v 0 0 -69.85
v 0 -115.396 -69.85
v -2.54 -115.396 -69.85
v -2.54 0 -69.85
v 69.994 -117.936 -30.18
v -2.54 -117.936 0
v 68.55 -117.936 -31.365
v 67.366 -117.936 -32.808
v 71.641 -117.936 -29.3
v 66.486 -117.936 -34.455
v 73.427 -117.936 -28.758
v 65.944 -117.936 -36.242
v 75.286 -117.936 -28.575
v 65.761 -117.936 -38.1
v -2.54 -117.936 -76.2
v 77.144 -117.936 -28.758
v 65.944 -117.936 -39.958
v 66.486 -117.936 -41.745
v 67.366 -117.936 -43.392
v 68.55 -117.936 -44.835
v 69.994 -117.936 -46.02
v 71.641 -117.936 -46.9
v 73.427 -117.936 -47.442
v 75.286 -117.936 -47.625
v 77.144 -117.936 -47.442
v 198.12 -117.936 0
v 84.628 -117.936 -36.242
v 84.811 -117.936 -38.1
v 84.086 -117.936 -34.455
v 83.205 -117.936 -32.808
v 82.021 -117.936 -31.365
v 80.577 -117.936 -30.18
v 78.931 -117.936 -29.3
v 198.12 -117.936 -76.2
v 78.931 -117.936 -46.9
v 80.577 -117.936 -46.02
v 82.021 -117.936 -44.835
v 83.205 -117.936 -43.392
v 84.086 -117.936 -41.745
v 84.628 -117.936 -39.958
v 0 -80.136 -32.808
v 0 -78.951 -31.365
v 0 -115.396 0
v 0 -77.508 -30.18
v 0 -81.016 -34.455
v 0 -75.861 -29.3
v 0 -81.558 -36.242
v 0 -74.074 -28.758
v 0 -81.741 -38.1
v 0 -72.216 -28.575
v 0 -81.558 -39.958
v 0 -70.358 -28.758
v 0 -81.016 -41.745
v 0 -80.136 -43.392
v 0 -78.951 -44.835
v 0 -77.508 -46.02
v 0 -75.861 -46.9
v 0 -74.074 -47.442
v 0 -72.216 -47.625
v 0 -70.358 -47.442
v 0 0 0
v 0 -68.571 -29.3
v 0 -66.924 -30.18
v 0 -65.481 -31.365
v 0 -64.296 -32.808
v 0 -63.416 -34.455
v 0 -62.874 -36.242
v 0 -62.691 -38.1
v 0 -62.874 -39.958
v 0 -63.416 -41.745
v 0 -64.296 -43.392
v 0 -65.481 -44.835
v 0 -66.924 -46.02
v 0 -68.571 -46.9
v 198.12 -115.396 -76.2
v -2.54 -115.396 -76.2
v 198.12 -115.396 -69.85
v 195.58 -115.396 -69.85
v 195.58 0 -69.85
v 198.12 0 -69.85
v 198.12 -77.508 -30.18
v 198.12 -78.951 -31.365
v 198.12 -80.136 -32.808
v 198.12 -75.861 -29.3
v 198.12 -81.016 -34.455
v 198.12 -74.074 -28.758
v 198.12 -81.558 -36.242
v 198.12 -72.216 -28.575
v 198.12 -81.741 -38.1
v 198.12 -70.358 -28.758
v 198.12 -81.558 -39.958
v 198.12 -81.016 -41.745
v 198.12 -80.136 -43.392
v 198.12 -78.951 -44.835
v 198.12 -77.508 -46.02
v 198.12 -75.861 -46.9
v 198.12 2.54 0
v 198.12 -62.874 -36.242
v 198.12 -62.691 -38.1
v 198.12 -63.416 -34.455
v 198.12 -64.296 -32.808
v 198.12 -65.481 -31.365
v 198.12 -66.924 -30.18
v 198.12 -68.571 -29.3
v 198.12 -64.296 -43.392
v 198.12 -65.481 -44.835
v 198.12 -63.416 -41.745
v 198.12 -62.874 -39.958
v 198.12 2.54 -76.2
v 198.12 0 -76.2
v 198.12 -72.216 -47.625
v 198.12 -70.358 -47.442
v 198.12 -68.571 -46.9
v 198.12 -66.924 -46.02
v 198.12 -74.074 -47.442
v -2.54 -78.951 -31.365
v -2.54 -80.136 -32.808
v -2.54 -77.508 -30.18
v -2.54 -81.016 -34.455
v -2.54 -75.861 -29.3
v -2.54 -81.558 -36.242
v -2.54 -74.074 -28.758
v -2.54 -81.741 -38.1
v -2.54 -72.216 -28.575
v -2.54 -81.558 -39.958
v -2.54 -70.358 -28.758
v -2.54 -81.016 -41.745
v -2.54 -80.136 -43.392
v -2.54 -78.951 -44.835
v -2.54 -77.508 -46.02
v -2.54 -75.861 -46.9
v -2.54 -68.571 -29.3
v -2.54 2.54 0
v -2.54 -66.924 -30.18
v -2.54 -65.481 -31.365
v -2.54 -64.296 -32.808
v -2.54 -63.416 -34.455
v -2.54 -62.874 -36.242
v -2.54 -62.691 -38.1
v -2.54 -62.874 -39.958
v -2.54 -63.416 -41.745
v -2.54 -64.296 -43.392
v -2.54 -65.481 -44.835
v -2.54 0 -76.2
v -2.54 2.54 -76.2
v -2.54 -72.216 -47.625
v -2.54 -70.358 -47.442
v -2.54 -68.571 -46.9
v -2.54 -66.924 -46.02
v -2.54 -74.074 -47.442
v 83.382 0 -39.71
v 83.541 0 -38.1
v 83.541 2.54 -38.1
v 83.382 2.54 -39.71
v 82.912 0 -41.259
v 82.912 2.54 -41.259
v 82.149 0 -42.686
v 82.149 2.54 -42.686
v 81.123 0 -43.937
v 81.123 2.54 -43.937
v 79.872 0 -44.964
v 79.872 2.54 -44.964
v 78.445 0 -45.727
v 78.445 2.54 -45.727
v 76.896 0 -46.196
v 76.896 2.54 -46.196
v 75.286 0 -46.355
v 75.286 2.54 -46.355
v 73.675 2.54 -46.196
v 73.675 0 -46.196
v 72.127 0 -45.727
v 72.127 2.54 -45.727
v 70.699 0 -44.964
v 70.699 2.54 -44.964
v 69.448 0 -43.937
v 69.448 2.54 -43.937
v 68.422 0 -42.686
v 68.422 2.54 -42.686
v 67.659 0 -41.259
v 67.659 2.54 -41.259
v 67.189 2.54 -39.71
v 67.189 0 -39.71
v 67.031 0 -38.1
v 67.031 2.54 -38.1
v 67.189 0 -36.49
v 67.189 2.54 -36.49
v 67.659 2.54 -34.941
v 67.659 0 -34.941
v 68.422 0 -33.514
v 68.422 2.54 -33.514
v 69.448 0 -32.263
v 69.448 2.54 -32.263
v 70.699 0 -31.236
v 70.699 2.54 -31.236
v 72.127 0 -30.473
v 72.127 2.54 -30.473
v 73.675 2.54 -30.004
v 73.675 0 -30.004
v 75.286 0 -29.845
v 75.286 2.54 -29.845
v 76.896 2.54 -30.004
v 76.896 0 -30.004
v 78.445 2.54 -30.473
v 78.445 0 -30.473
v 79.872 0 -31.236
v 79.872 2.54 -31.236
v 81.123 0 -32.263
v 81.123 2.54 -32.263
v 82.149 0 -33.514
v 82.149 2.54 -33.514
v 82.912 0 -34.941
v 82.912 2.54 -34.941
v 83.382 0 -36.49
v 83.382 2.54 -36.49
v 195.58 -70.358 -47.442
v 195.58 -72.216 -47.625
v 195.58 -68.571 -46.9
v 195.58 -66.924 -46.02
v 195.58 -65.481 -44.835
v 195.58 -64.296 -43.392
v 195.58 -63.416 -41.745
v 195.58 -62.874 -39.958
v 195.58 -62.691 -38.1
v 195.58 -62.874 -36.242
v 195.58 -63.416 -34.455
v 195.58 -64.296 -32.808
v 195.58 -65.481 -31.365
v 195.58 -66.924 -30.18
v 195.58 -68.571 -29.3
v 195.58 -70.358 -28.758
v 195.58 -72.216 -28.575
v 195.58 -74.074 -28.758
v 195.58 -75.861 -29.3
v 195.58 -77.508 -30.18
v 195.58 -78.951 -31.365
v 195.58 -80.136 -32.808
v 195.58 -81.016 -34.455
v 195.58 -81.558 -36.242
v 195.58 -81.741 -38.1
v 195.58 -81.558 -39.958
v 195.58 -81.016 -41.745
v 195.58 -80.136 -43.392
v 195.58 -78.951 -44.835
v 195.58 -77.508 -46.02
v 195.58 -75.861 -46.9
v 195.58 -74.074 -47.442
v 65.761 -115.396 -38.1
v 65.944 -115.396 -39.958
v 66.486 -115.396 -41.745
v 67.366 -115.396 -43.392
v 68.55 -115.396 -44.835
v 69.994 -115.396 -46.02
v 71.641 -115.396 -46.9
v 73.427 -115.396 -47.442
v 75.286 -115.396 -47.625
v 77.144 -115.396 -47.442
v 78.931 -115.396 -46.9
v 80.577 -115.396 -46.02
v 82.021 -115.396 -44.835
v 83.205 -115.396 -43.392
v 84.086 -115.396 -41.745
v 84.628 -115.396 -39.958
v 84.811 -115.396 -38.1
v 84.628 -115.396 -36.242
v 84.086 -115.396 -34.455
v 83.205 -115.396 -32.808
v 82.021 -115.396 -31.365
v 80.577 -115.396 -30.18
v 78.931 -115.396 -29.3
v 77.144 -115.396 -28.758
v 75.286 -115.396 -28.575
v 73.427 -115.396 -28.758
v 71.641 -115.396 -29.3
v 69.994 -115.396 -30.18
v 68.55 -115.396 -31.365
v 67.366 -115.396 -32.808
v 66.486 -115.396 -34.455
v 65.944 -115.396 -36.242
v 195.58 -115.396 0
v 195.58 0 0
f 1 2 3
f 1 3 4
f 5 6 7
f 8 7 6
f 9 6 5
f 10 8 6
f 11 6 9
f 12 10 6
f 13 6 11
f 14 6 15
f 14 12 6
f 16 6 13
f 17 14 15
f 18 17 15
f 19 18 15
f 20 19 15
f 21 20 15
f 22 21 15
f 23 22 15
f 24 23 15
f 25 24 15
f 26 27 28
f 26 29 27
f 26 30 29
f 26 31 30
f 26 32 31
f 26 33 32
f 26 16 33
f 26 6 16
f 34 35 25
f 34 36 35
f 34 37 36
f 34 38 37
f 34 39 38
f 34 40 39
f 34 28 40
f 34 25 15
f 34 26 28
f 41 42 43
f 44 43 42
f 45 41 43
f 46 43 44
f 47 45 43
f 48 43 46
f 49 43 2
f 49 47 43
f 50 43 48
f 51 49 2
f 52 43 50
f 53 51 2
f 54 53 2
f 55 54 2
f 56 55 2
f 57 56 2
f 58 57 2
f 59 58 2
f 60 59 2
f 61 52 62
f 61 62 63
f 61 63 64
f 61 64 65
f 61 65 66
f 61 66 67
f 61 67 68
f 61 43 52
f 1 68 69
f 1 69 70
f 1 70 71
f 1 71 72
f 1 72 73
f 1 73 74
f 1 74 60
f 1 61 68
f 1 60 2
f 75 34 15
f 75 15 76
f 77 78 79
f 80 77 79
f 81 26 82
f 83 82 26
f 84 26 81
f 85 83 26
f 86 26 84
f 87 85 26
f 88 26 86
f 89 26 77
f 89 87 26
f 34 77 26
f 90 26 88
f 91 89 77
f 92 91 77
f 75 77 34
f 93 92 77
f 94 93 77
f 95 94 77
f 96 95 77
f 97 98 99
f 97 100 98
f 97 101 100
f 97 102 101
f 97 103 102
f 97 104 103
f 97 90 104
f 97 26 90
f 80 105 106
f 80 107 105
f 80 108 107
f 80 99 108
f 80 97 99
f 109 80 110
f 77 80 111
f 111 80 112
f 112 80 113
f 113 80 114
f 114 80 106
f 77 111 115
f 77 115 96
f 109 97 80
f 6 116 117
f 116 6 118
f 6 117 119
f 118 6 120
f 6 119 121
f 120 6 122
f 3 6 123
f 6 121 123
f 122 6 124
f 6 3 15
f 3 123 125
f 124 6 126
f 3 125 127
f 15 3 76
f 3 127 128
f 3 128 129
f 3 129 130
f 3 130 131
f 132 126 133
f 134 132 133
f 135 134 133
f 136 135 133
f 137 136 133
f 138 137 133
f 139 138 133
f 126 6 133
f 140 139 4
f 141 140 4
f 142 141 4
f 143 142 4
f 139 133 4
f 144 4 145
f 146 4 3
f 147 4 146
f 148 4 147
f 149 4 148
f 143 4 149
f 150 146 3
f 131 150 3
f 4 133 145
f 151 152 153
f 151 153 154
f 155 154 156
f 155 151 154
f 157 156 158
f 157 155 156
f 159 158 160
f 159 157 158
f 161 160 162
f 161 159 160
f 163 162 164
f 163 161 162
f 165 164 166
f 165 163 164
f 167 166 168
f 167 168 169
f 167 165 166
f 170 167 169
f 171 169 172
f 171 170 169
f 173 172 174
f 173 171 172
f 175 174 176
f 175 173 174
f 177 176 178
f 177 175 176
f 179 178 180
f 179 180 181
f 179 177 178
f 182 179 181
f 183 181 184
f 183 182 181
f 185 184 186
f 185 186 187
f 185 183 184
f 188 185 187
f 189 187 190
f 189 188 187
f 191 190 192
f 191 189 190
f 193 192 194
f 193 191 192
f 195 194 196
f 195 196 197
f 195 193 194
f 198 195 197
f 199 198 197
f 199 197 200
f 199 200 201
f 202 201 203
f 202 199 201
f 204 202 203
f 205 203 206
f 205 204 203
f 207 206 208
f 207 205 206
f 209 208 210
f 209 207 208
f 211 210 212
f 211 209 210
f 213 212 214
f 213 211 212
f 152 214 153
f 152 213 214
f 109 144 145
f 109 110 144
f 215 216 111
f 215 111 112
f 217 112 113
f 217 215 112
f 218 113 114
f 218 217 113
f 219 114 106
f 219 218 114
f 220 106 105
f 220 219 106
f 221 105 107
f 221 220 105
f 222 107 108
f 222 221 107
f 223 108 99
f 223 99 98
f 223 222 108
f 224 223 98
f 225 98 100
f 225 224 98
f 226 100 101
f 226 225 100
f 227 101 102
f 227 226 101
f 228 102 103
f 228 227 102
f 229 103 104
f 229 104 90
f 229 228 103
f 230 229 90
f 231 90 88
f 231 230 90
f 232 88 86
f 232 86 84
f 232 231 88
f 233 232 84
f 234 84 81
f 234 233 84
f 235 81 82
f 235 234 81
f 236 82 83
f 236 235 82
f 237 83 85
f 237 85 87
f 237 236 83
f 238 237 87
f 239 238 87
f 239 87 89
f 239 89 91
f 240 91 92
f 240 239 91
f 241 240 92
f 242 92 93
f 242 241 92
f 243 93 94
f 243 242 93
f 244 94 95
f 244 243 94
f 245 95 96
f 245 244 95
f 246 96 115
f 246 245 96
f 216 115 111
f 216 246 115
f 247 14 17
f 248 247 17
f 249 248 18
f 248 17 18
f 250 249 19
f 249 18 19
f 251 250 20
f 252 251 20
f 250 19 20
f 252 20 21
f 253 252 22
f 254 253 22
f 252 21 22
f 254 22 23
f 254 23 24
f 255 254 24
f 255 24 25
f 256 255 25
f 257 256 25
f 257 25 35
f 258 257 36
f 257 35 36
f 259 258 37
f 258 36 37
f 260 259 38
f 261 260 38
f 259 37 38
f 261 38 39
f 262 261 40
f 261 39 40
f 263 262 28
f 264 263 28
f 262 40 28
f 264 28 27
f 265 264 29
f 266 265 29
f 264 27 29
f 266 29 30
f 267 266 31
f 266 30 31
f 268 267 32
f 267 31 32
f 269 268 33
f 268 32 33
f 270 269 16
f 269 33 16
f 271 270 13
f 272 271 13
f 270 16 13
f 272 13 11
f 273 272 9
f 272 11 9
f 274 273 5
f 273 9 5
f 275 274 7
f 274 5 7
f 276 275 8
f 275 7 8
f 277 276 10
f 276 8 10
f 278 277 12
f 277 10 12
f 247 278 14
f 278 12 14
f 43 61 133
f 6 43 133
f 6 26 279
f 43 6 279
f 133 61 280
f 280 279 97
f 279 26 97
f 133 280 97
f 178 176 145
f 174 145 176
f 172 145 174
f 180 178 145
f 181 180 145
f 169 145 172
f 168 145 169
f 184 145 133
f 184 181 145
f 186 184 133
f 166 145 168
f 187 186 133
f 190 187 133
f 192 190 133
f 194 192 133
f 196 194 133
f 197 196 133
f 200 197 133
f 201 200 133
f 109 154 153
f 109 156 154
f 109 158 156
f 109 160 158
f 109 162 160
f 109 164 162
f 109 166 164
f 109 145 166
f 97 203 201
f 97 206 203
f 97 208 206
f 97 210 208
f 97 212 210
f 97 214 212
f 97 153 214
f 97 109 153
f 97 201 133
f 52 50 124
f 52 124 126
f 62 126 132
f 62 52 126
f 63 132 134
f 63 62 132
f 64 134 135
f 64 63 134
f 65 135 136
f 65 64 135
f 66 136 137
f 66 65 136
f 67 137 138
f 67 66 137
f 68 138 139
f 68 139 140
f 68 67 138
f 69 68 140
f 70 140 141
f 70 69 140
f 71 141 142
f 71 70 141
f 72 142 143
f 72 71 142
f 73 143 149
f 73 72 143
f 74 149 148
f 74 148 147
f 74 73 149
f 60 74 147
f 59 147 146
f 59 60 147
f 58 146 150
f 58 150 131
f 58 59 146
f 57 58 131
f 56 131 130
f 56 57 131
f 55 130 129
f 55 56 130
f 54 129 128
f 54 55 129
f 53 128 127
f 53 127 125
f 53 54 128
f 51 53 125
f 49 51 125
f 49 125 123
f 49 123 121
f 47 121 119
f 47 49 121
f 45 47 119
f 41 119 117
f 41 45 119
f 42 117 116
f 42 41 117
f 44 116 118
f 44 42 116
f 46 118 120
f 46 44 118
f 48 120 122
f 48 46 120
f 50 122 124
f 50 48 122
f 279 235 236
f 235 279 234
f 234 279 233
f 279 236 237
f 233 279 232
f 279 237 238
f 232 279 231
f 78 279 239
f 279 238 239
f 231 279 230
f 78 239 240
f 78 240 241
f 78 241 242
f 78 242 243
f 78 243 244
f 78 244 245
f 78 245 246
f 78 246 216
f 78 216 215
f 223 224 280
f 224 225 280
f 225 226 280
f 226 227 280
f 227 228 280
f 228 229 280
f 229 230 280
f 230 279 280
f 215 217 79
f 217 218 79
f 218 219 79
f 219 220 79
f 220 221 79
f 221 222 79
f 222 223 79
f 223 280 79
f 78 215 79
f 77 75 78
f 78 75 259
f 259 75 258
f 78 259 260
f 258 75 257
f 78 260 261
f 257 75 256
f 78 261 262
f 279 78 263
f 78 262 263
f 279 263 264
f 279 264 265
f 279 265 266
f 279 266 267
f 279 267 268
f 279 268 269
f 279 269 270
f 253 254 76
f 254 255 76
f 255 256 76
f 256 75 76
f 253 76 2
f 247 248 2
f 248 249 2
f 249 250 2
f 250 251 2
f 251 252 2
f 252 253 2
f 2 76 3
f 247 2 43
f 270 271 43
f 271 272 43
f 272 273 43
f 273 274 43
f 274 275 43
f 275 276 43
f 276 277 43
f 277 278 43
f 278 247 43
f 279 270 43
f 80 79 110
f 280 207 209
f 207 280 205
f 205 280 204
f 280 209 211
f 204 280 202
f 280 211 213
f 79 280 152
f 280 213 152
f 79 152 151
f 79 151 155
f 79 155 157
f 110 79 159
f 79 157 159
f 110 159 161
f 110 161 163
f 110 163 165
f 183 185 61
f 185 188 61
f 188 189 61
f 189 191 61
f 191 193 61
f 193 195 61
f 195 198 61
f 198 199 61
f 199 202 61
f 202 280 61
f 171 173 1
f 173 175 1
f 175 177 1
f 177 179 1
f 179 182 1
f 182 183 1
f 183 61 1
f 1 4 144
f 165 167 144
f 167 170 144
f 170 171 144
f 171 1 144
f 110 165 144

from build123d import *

# Parameters (mm, degrees)
SKETCH4_W           = 195.58
SKETCH4_H           = 76.2
SKETCH4_R           = 8.255
BOSS_EXTRUDE2_DEPTH = 2.54
SKETCH7_R           = 9.525
SKETCH7_W           = 76.2
SKETCH7_H           = 2.54
BOSS_EXTRUDE4_DEPTH = 2.54
SKETCH9_R           = 9.525
BOSS_EXTRUDE5_DEPTH = 2.54
SKETCH10_R          = 9.525
BOSS_EXTRUDE6_DEPTH = 2.54


with BuildPart() as part:
    # Sketch4 → Boss-Extrude2 (new body)
    with BuildSketch(Plane(origin=(0, 0, 0), x_dir=(1, 0, 0), z_dir=(0, 1, 0))):
        with Locations((97.79, 38.1)):
            Rectangle(SKETCH4_W, SKETCH4_H)
        with Locations((75.2856, 38.1)):
            Circle(SKETCH4_R, mode=Mode.SUBTRACT)
    extrude(amount=BOSS_EXTRUDE2_DEPTH)

    # Sketch7 → Boss-Extrude4 (add)
    with BuildSketch(Plane(origin=(195.58, 0, 0), x_dir=(0, 0, -1), z_dir=(1, 0, 0))):
        Polygon((69.85, 0), (0, 0), (0, -115.396245002), (0, -117.936245002), (76.2, -117.936245002), (76.2, -115.396245002), (69.85, -115.396245002), align=None)
        with Locations((38.1, -72.216245002)):
            Circle(SKETCH7_R, mode=Mode.SUBTRACT)
        with Locations((38.1, 1.27)):
            Rectangle(SKETCH7_W, SKETCH7_H)
    extrude(amount=BOSS_EXTRUDE4_DEPTH)

    # Sketch9 → Boss-Extrude5 (add)
    with BuildSketch(Plane(origin=(0, -117.936245002, 0), x_dir=(-1, 0, 0), z_dir=(0, -1, 0))):
        Polygon((-198.12, 0), (-195.58, 0), (0, 0), (0, 76.2), (-195.58, 76.2), (-198.12, 76.2), align=None)
        with Locations((-75.2856, 38.1)):
            Circle(SKETCH9_R, mode=Mode.SUBTRACT)
    extrude(amount=-BOSS_EXTRUDE5_DEPTH)

    # Sketch10 → Boss-Extrude6 (add)
    with BuildSketch(Plane.ZY):
        Polygon((0, 2.54), (0, 0), (0, -115.396245002), (0, -117.936245002), (-76.2, -117.936245002), (-76.2, -115.396245002), (-69.85, -115.396245002), (-69.85, 0), (-76.2, 0), (-76.2, 2.54), align=None)
        with Locations((-38.1, -72.216245002)):
            Circle(SKETCH10_R, mode=Mode.SUBTRACT)
    extrude(amount=BOSS_EXTRUDE6_DEPTH)


solid = part.part
